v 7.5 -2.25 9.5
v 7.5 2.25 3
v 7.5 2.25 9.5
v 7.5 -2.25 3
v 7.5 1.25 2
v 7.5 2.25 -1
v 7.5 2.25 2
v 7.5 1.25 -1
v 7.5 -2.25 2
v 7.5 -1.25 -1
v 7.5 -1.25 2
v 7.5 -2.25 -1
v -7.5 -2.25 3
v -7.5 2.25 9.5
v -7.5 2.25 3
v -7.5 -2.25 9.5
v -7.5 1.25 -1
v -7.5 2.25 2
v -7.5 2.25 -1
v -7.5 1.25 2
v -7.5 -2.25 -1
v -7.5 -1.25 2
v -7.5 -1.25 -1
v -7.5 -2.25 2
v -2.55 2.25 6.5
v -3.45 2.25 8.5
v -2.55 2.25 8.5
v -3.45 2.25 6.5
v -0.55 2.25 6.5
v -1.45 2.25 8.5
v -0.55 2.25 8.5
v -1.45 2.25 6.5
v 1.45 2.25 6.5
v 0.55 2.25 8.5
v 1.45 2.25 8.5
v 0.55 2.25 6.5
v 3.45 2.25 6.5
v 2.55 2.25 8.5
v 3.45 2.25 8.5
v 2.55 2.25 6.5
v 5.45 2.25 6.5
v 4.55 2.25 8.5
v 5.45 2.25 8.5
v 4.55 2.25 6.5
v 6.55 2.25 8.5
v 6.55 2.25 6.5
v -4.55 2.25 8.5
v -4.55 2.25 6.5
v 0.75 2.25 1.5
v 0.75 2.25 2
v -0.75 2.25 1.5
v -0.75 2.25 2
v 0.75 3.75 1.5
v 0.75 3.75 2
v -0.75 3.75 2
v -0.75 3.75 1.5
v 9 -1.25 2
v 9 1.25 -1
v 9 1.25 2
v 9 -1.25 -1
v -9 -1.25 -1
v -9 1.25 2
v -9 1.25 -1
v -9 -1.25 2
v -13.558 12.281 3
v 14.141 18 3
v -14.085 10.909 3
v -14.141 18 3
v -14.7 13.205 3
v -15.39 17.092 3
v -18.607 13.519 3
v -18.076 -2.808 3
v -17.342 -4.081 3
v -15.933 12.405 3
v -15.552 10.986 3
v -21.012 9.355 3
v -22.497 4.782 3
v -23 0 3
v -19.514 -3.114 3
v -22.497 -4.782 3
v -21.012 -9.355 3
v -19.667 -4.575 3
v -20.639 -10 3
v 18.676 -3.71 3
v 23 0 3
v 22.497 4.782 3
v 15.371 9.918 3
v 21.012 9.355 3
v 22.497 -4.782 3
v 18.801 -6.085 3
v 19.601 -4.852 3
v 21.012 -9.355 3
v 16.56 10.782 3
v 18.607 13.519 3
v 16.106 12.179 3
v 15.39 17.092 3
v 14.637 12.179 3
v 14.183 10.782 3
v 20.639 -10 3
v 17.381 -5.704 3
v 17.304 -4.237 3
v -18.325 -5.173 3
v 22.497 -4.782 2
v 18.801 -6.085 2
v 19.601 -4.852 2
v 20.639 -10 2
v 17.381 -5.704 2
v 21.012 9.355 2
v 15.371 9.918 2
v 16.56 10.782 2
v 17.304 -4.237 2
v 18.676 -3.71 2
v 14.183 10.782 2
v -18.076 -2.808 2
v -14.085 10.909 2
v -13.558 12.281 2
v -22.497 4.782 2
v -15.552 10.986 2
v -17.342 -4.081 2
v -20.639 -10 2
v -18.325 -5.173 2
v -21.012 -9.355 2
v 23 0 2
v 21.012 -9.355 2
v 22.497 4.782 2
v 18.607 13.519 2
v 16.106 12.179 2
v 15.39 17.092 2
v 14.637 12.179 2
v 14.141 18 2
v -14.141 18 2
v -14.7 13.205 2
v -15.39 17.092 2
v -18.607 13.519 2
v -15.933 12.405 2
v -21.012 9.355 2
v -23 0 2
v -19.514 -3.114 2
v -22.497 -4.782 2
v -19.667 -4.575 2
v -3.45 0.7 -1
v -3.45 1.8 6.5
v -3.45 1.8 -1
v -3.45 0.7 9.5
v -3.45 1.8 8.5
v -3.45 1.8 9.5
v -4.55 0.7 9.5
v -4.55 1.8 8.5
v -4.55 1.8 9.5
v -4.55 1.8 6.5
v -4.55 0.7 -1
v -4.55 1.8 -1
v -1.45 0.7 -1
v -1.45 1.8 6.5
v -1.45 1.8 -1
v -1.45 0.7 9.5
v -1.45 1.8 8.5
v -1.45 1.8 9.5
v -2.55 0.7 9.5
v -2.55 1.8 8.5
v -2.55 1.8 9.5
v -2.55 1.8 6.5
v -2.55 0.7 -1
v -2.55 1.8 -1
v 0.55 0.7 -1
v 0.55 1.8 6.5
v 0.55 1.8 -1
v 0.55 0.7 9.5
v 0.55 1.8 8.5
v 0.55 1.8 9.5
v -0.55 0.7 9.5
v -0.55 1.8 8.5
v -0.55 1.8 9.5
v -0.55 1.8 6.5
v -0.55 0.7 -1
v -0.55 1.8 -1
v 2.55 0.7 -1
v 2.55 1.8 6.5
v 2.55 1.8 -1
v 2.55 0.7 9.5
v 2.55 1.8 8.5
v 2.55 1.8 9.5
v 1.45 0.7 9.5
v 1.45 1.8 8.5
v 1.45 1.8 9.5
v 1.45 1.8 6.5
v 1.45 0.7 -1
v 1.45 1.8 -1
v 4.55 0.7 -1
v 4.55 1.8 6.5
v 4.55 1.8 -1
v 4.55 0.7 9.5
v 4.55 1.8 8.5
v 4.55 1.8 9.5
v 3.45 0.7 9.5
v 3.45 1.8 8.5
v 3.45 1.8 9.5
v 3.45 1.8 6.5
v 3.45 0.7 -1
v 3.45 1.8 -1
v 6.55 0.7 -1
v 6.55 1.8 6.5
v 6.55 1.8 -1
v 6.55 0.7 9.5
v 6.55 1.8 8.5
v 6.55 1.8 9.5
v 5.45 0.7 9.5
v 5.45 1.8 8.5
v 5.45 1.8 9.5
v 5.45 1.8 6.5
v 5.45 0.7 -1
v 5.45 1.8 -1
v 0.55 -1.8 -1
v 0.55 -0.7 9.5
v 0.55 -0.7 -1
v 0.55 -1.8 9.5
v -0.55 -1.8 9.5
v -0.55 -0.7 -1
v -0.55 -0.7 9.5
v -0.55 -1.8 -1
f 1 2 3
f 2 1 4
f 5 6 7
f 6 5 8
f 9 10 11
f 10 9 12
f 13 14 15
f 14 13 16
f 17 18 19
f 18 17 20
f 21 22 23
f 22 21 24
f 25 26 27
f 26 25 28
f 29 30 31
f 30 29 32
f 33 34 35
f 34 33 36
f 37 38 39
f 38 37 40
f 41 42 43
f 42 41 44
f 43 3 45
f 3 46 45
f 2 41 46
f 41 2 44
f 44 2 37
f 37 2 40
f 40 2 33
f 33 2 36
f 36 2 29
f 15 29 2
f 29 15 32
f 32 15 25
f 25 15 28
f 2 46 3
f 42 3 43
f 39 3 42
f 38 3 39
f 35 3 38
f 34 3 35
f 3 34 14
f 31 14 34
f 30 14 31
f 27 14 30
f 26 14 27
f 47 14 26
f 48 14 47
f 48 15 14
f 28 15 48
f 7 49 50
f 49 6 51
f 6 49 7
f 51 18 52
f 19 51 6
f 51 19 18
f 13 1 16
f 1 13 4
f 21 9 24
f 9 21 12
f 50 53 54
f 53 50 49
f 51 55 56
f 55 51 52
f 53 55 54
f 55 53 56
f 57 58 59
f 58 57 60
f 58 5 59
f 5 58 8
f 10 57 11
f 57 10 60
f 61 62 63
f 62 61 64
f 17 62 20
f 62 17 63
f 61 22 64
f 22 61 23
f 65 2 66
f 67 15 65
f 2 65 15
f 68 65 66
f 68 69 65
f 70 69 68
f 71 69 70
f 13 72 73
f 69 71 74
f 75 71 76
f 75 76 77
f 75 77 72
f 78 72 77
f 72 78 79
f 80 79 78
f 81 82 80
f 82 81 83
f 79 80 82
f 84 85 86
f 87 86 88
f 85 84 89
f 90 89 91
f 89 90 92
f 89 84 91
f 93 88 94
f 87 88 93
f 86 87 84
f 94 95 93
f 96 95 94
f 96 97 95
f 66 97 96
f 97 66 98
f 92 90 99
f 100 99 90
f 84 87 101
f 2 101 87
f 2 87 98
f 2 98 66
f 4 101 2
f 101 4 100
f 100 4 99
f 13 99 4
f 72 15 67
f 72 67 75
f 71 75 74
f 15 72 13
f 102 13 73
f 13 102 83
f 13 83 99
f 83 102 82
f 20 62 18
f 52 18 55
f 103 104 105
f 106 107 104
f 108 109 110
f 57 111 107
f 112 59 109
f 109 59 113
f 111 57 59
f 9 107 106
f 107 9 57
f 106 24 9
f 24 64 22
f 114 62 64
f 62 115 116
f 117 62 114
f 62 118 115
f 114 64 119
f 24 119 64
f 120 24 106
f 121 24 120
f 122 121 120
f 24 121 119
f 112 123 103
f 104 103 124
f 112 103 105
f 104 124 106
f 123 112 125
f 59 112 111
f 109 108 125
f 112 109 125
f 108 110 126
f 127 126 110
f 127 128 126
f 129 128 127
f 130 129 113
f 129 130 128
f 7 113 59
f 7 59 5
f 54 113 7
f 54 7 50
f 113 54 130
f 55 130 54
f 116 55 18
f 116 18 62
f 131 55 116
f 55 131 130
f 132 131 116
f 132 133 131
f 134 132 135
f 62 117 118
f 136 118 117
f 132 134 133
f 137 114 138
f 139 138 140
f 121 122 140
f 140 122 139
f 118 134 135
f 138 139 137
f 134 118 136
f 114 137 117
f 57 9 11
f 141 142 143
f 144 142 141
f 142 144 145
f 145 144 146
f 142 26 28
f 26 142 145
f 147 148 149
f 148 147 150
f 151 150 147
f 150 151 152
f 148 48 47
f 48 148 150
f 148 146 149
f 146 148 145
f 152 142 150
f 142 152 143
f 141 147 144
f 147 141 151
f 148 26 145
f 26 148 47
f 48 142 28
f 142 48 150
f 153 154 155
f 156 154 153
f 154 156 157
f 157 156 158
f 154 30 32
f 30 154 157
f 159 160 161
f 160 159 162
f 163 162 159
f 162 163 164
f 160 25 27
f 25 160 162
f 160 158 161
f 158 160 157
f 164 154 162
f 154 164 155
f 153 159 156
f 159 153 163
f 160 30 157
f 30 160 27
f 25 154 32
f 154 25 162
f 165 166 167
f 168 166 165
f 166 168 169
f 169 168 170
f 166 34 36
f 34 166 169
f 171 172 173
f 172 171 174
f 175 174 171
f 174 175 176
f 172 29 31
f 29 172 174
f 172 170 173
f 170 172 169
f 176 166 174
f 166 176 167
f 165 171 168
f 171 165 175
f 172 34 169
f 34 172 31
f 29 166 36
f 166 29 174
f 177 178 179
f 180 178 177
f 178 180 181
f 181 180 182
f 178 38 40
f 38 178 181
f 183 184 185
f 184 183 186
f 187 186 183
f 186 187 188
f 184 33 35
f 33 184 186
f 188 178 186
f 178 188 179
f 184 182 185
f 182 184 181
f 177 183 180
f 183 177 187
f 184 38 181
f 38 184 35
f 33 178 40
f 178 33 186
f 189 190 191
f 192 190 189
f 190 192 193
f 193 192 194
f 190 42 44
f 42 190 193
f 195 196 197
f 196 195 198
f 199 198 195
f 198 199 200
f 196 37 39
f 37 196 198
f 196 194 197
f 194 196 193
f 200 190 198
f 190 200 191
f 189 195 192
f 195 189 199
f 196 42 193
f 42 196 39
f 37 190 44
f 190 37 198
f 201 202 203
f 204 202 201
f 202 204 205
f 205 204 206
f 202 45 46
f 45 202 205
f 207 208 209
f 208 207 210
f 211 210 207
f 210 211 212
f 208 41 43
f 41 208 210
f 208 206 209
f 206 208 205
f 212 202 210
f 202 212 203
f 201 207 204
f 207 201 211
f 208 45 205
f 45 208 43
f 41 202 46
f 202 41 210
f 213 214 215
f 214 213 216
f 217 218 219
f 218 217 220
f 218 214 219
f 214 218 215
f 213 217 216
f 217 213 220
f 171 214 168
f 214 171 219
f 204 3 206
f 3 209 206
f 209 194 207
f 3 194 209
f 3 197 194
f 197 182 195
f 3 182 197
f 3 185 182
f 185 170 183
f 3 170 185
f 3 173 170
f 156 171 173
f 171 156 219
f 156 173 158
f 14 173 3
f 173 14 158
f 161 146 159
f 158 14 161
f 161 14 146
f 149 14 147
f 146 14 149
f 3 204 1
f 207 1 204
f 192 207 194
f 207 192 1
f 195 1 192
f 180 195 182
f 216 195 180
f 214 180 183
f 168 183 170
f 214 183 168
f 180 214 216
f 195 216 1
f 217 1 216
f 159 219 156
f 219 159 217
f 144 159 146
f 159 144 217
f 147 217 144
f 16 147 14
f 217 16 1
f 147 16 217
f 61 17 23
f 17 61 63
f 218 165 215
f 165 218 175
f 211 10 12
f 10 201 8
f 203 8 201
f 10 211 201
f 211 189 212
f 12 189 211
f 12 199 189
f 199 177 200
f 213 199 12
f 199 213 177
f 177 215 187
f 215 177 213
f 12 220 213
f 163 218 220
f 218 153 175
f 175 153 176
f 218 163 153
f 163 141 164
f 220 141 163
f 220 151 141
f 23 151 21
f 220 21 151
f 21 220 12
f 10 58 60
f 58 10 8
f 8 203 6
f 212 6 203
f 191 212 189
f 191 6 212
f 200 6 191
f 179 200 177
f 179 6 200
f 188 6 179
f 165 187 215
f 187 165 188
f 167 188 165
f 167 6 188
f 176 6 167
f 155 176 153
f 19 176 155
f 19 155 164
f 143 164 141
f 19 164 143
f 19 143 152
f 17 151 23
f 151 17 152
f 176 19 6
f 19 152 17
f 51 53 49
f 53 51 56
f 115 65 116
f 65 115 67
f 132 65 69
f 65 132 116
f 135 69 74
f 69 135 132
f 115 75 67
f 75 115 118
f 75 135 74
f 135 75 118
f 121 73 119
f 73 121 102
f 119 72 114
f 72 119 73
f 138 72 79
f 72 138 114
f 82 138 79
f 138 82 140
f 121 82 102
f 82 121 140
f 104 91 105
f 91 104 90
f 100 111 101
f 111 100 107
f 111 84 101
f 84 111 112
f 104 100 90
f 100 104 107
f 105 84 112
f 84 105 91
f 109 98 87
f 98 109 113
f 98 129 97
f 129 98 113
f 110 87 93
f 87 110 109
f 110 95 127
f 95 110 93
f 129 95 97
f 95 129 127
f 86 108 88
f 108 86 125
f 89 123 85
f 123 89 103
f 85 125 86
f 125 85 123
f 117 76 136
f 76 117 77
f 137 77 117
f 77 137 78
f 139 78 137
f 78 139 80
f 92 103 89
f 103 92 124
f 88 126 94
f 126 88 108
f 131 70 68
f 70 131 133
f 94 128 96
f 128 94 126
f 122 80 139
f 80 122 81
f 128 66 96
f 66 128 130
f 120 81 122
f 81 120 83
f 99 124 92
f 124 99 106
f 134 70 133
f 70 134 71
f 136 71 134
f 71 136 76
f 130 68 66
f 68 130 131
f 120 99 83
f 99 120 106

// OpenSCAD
box_length = 15;
box_width = 4.5;
box_height = 5;
box_height_extra = 5.5;
pin_pad = 0.5;
pin_width = 1.1;
nop_width = 1.5;
nop_height = 1;

sidepin_width = 2.5;

module holebox(x = 0, y = 0, z = 0, withHoles = 1){
    translate([x,y,z+1.5]){
        difference(){
            translate([0,0,box_height_extra/2])
            cube([box_length, box_width, box_height+box_height_extra], center = true);
        
            if (withHoles != 0){
                for ( i = [-3 : 3]){
                    if (i != -3){
                        translate([i*2, box_width/2-1, 0])
                            cube([pin_width, pin_width, box_height+1+box_height_extra*2], center = true);
                        
                        //sideholes
                        translate([i*2-pin_width/2,box_width/2-1,box_height])
                            cube([pin_width,1,2]);
                    }
                    if (i == 0)
                    translate([i*2, -(box_width/2-1), 0])
                        cube([pin_width, pin_width, box_height+1+box_height_extra*2], center = true);
                }
            }
        }
        

        //pin
        translate([0, box_width/2 + nop_width/2, box_height/2-nop_height/2 - pin_pad-1])
            cube([nop_width, nop_width, nop_height], center = true);
        translate([0, box_width/2 + nop_width/2, box_height/2-nop_height/2-1])
            cube([nop_width, nop_width, nop_height], center = true);
        
        
        //sidepin right
        translate([box_length/2 + nop_width/2, 0, -0.5])
            cube([nop_width, sidepin_width, box_height-1], center = true);

        //sidepin left
        translate([-(box_length/2 + nop_width/2), 0, -0.5])
            cube([nop_width, sidepin_width, box_height-1], center = true);
        
    }
}

support_len = 2;
support_width = 4;
thickness = 1;
module foot(x = 0, y = 0, z = 0){
    
    leg_len = 4;
    
    translate([x-support_width/2,y-support_len/2,z]){
        translate([0,0,1])
            cube([support_width,2,1]);

/*        
        translate([0,0,-leg_len/2])
        rotate([-90,0,0])
        rotate([0,90,0])
        color("blue")
        cylinder(support_width,1,1,$fn=3);

        
        translate([0,-0.5,0])
        rotate([0,0,0]){
            translate([0,0,-leg_len+2])
                cube([support_width,thickness,leg_len]);                    
        }
*/
    }
}

module hole(x = 0, y = 0, z = 0){
    translate([x,y,z-1]){
        cylinder(3,1.25,1.25);
    }
}


module adapter(x = 0, y = 0, z = 0){
    plate_length = box_width + 8;
    plate_width = box_length + 8;
    plate_thickness = 1;
    
    plate_conn = 4;
    
    fplate_radius = 23;
    
    pull_cylinder_radius = 2;
    pull_cylinder_height = 10;
    
    translate([x,y,z]){
        difference(){
            translate([0,0,nop_height+plate_thickness+0.5])
                color("green")
                cube([plate_width, plate_length, plate_thickness], center = true);            
            translate([0,0,1])
                holebox(0,0,0,0);
        }
        color("red") 
        holebox(0,0,0);
        
        translate([0,0,nop_height+plate_thickness])
        difference(){
            cylinder(1, fplate_radius, fplate_radius);
            cube([plate_width-plate_conn, plate_length-plate_conn, plate_thickness+5], center = true);            

            for ( i = [1,2,5,6]){
                rotate([0,0,51*i + 180])
                    hole(0,-fplate_radius+4,0);
            }
            
            translate([-20,18,-1])
                cube([50,10,3]);
            translate([-30,-30,-1])
                cube([100,20,3]);
        }

/* 
        for ( i = [0:6]){
            rotate([0,0,51*i])
                foot(0,-fplate_radius,nop_height);            
        }
*/
    }
}


//holebox(0,0,0);

adapter(0,0,0);
